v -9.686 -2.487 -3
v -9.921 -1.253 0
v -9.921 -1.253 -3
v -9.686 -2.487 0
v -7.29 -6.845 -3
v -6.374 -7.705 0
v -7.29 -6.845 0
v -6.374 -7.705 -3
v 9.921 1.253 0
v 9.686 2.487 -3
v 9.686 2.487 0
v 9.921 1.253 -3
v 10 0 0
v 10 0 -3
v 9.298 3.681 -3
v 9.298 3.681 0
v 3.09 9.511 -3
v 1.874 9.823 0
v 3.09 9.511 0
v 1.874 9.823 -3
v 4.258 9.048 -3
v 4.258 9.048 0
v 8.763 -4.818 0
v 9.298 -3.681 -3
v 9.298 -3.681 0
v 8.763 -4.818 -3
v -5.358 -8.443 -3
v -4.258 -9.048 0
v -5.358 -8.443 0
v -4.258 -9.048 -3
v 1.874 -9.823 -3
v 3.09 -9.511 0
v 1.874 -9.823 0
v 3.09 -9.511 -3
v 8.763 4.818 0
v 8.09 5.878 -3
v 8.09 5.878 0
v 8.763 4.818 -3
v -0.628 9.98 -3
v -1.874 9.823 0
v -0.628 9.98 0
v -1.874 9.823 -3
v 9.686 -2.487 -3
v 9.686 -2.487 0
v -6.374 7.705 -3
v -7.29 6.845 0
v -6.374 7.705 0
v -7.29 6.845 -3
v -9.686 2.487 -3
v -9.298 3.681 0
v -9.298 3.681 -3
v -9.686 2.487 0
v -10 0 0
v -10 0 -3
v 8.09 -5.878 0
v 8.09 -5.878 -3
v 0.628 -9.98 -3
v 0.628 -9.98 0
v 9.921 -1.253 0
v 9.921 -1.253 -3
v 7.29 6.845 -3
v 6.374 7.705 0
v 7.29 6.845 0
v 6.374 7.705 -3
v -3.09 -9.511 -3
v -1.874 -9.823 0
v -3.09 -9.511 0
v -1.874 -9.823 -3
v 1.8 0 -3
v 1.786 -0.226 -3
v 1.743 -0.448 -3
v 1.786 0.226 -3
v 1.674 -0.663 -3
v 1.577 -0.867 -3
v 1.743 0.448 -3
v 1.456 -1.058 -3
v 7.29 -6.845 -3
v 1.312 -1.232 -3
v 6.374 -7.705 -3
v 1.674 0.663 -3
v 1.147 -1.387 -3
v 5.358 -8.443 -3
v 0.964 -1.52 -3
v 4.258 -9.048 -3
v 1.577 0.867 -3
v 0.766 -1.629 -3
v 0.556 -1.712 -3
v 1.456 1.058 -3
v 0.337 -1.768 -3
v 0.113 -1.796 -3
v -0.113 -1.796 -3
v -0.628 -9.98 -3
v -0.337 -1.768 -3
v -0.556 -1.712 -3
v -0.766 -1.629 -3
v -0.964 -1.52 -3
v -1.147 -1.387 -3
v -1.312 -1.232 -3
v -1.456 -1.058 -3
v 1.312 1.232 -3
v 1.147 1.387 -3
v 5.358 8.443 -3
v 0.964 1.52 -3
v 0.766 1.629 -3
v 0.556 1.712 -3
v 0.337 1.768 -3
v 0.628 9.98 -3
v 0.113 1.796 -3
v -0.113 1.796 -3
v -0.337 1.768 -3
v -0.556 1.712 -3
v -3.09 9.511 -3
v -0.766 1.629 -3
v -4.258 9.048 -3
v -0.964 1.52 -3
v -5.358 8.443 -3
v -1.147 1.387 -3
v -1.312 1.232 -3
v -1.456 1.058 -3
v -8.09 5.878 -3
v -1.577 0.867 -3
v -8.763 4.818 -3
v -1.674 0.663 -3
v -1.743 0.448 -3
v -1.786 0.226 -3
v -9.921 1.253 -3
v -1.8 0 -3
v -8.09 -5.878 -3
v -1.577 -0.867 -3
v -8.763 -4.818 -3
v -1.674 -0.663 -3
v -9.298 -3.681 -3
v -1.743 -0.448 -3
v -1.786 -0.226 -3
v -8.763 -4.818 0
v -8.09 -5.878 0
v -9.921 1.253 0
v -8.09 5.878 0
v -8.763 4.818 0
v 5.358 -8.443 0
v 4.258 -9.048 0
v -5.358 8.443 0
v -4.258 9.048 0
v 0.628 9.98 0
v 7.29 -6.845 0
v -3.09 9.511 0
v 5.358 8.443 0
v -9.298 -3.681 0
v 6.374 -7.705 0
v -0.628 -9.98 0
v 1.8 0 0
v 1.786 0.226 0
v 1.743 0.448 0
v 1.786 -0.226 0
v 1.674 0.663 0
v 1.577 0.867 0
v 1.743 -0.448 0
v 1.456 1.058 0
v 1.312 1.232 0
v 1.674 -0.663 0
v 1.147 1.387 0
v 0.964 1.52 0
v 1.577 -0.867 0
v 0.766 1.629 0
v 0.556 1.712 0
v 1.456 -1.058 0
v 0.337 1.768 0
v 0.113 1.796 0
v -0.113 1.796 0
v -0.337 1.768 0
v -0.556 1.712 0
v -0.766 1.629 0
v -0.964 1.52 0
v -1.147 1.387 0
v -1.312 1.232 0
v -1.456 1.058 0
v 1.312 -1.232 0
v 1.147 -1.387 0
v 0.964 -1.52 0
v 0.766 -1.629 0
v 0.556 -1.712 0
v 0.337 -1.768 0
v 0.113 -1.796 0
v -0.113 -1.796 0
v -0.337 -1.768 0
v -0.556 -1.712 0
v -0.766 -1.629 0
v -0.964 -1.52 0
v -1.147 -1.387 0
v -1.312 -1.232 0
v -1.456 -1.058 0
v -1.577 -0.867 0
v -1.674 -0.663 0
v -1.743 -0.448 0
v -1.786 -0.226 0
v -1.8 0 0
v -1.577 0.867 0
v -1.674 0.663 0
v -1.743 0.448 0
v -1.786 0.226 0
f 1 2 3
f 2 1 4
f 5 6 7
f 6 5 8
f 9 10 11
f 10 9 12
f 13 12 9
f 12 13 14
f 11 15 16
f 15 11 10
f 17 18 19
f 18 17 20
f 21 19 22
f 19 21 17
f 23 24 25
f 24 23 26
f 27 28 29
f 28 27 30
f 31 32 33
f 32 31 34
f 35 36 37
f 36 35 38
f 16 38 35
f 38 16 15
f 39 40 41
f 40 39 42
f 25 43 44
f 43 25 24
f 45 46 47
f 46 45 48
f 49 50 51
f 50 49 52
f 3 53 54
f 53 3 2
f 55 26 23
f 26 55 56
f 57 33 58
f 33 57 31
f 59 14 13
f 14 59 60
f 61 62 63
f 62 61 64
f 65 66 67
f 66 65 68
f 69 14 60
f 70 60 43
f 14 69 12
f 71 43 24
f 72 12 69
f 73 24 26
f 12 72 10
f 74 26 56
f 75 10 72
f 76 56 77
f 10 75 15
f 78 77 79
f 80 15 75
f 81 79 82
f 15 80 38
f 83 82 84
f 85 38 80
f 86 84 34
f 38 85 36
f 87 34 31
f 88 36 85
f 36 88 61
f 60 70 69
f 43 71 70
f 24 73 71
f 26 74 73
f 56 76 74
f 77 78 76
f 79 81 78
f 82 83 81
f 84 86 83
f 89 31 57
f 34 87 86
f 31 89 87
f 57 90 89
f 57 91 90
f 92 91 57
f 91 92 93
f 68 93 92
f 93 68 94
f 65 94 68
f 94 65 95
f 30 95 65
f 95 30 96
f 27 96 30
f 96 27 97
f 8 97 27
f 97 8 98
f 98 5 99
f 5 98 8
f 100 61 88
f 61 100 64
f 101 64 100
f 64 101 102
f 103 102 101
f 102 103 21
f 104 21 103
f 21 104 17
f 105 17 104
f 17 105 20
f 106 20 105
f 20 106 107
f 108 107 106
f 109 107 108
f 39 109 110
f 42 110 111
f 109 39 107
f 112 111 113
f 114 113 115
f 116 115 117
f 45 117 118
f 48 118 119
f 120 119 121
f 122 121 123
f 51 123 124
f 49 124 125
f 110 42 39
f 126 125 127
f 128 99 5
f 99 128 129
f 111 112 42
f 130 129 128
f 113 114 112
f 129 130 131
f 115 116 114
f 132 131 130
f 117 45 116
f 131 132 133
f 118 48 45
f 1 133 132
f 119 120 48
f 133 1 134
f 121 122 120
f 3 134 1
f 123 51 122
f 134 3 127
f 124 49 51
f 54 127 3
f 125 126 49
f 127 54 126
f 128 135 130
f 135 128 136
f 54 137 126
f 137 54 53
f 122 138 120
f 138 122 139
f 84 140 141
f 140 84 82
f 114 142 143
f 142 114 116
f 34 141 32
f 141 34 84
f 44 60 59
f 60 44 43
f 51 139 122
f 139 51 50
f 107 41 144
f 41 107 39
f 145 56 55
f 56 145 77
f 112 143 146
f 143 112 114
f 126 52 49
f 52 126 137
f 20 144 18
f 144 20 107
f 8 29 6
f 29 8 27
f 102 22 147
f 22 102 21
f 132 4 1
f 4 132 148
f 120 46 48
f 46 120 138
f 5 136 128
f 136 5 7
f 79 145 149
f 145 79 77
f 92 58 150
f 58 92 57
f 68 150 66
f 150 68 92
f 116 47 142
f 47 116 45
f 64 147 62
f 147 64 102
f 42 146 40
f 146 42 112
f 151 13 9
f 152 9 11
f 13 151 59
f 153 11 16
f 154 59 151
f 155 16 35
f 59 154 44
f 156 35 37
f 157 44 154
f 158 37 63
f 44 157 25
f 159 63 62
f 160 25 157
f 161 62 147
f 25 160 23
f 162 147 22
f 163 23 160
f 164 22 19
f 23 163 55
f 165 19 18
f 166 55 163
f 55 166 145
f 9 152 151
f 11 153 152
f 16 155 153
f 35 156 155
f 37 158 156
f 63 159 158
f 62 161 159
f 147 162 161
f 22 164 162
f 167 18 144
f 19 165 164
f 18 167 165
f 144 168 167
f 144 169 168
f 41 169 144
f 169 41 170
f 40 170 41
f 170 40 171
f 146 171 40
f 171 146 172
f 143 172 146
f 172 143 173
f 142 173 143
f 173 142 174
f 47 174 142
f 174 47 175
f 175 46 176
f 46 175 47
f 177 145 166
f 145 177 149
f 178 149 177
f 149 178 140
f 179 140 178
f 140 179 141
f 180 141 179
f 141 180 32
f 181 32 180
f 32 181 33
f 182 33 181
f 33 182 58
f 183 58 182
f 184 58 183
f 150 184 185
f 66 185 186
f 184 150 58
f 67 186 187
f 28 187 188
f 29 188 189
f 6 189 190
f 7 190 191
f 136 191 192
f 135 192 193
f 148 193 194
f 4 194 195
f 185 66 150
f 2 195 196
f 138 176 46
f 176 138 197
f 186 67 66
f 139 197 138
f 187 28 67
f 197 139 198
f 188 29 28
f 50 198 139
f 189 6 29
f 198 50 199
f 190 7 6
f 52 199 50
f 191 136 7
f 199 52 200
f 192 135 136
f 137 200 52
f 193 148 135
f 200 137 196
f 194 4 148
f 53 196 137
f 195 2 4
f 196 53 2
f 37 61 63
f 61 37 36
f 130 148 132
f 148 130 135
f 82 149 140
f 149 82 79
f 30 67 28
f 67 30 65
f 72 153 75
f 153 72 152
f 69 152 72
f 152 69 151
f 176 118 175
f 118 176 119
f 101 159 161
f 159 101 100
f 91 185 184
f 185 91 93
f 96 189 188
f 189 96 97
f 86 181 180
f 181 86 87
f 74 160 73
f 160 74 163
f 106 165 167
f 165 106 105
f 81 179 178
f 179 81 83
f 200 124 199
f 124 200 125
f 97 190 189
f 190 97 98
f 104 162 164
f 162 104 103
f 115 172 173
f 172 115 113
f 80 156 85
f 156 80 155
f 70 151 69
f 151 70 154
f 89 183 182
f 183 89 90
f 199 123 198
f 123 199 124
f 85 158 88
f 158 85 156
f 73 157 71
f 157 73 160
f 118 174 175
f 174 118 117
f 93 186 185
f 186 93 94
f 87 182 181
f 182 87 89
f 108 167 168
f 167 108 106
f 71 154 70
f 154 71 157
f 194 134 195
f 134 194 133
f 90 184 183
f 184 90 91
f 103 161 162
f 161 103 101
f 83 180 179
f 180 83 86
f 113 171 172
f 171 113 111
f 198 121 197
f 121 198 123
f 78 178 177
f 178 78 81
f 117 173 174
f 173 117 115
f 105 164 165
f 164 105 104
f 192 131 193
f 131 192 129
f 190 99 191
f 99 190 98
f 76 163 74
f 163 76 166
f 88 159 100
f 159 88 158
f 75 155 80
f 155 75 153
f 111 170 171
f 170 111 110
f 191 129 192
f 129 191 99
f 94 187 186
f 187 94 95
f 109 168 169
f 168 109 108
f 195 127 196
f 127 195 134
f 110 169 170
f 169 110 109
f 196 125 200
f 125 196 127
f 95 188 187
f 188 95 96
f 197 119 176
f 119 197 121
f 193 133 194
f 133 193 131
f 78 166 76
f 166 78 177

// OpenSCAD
$fn = 50;


difference() {
	union() {
		translate(v = [0, 0, -3.0000000000]) {
			cylinder(h = 3, r = 10.0000000000);
		}
		cylinder(h = 0, r = 16.0000000000);
	}
	union() {
		#translate(v = [0, 0, -3]) {
			cylinder(h = 3, r = 1.8000000000);
		}
	}
}
